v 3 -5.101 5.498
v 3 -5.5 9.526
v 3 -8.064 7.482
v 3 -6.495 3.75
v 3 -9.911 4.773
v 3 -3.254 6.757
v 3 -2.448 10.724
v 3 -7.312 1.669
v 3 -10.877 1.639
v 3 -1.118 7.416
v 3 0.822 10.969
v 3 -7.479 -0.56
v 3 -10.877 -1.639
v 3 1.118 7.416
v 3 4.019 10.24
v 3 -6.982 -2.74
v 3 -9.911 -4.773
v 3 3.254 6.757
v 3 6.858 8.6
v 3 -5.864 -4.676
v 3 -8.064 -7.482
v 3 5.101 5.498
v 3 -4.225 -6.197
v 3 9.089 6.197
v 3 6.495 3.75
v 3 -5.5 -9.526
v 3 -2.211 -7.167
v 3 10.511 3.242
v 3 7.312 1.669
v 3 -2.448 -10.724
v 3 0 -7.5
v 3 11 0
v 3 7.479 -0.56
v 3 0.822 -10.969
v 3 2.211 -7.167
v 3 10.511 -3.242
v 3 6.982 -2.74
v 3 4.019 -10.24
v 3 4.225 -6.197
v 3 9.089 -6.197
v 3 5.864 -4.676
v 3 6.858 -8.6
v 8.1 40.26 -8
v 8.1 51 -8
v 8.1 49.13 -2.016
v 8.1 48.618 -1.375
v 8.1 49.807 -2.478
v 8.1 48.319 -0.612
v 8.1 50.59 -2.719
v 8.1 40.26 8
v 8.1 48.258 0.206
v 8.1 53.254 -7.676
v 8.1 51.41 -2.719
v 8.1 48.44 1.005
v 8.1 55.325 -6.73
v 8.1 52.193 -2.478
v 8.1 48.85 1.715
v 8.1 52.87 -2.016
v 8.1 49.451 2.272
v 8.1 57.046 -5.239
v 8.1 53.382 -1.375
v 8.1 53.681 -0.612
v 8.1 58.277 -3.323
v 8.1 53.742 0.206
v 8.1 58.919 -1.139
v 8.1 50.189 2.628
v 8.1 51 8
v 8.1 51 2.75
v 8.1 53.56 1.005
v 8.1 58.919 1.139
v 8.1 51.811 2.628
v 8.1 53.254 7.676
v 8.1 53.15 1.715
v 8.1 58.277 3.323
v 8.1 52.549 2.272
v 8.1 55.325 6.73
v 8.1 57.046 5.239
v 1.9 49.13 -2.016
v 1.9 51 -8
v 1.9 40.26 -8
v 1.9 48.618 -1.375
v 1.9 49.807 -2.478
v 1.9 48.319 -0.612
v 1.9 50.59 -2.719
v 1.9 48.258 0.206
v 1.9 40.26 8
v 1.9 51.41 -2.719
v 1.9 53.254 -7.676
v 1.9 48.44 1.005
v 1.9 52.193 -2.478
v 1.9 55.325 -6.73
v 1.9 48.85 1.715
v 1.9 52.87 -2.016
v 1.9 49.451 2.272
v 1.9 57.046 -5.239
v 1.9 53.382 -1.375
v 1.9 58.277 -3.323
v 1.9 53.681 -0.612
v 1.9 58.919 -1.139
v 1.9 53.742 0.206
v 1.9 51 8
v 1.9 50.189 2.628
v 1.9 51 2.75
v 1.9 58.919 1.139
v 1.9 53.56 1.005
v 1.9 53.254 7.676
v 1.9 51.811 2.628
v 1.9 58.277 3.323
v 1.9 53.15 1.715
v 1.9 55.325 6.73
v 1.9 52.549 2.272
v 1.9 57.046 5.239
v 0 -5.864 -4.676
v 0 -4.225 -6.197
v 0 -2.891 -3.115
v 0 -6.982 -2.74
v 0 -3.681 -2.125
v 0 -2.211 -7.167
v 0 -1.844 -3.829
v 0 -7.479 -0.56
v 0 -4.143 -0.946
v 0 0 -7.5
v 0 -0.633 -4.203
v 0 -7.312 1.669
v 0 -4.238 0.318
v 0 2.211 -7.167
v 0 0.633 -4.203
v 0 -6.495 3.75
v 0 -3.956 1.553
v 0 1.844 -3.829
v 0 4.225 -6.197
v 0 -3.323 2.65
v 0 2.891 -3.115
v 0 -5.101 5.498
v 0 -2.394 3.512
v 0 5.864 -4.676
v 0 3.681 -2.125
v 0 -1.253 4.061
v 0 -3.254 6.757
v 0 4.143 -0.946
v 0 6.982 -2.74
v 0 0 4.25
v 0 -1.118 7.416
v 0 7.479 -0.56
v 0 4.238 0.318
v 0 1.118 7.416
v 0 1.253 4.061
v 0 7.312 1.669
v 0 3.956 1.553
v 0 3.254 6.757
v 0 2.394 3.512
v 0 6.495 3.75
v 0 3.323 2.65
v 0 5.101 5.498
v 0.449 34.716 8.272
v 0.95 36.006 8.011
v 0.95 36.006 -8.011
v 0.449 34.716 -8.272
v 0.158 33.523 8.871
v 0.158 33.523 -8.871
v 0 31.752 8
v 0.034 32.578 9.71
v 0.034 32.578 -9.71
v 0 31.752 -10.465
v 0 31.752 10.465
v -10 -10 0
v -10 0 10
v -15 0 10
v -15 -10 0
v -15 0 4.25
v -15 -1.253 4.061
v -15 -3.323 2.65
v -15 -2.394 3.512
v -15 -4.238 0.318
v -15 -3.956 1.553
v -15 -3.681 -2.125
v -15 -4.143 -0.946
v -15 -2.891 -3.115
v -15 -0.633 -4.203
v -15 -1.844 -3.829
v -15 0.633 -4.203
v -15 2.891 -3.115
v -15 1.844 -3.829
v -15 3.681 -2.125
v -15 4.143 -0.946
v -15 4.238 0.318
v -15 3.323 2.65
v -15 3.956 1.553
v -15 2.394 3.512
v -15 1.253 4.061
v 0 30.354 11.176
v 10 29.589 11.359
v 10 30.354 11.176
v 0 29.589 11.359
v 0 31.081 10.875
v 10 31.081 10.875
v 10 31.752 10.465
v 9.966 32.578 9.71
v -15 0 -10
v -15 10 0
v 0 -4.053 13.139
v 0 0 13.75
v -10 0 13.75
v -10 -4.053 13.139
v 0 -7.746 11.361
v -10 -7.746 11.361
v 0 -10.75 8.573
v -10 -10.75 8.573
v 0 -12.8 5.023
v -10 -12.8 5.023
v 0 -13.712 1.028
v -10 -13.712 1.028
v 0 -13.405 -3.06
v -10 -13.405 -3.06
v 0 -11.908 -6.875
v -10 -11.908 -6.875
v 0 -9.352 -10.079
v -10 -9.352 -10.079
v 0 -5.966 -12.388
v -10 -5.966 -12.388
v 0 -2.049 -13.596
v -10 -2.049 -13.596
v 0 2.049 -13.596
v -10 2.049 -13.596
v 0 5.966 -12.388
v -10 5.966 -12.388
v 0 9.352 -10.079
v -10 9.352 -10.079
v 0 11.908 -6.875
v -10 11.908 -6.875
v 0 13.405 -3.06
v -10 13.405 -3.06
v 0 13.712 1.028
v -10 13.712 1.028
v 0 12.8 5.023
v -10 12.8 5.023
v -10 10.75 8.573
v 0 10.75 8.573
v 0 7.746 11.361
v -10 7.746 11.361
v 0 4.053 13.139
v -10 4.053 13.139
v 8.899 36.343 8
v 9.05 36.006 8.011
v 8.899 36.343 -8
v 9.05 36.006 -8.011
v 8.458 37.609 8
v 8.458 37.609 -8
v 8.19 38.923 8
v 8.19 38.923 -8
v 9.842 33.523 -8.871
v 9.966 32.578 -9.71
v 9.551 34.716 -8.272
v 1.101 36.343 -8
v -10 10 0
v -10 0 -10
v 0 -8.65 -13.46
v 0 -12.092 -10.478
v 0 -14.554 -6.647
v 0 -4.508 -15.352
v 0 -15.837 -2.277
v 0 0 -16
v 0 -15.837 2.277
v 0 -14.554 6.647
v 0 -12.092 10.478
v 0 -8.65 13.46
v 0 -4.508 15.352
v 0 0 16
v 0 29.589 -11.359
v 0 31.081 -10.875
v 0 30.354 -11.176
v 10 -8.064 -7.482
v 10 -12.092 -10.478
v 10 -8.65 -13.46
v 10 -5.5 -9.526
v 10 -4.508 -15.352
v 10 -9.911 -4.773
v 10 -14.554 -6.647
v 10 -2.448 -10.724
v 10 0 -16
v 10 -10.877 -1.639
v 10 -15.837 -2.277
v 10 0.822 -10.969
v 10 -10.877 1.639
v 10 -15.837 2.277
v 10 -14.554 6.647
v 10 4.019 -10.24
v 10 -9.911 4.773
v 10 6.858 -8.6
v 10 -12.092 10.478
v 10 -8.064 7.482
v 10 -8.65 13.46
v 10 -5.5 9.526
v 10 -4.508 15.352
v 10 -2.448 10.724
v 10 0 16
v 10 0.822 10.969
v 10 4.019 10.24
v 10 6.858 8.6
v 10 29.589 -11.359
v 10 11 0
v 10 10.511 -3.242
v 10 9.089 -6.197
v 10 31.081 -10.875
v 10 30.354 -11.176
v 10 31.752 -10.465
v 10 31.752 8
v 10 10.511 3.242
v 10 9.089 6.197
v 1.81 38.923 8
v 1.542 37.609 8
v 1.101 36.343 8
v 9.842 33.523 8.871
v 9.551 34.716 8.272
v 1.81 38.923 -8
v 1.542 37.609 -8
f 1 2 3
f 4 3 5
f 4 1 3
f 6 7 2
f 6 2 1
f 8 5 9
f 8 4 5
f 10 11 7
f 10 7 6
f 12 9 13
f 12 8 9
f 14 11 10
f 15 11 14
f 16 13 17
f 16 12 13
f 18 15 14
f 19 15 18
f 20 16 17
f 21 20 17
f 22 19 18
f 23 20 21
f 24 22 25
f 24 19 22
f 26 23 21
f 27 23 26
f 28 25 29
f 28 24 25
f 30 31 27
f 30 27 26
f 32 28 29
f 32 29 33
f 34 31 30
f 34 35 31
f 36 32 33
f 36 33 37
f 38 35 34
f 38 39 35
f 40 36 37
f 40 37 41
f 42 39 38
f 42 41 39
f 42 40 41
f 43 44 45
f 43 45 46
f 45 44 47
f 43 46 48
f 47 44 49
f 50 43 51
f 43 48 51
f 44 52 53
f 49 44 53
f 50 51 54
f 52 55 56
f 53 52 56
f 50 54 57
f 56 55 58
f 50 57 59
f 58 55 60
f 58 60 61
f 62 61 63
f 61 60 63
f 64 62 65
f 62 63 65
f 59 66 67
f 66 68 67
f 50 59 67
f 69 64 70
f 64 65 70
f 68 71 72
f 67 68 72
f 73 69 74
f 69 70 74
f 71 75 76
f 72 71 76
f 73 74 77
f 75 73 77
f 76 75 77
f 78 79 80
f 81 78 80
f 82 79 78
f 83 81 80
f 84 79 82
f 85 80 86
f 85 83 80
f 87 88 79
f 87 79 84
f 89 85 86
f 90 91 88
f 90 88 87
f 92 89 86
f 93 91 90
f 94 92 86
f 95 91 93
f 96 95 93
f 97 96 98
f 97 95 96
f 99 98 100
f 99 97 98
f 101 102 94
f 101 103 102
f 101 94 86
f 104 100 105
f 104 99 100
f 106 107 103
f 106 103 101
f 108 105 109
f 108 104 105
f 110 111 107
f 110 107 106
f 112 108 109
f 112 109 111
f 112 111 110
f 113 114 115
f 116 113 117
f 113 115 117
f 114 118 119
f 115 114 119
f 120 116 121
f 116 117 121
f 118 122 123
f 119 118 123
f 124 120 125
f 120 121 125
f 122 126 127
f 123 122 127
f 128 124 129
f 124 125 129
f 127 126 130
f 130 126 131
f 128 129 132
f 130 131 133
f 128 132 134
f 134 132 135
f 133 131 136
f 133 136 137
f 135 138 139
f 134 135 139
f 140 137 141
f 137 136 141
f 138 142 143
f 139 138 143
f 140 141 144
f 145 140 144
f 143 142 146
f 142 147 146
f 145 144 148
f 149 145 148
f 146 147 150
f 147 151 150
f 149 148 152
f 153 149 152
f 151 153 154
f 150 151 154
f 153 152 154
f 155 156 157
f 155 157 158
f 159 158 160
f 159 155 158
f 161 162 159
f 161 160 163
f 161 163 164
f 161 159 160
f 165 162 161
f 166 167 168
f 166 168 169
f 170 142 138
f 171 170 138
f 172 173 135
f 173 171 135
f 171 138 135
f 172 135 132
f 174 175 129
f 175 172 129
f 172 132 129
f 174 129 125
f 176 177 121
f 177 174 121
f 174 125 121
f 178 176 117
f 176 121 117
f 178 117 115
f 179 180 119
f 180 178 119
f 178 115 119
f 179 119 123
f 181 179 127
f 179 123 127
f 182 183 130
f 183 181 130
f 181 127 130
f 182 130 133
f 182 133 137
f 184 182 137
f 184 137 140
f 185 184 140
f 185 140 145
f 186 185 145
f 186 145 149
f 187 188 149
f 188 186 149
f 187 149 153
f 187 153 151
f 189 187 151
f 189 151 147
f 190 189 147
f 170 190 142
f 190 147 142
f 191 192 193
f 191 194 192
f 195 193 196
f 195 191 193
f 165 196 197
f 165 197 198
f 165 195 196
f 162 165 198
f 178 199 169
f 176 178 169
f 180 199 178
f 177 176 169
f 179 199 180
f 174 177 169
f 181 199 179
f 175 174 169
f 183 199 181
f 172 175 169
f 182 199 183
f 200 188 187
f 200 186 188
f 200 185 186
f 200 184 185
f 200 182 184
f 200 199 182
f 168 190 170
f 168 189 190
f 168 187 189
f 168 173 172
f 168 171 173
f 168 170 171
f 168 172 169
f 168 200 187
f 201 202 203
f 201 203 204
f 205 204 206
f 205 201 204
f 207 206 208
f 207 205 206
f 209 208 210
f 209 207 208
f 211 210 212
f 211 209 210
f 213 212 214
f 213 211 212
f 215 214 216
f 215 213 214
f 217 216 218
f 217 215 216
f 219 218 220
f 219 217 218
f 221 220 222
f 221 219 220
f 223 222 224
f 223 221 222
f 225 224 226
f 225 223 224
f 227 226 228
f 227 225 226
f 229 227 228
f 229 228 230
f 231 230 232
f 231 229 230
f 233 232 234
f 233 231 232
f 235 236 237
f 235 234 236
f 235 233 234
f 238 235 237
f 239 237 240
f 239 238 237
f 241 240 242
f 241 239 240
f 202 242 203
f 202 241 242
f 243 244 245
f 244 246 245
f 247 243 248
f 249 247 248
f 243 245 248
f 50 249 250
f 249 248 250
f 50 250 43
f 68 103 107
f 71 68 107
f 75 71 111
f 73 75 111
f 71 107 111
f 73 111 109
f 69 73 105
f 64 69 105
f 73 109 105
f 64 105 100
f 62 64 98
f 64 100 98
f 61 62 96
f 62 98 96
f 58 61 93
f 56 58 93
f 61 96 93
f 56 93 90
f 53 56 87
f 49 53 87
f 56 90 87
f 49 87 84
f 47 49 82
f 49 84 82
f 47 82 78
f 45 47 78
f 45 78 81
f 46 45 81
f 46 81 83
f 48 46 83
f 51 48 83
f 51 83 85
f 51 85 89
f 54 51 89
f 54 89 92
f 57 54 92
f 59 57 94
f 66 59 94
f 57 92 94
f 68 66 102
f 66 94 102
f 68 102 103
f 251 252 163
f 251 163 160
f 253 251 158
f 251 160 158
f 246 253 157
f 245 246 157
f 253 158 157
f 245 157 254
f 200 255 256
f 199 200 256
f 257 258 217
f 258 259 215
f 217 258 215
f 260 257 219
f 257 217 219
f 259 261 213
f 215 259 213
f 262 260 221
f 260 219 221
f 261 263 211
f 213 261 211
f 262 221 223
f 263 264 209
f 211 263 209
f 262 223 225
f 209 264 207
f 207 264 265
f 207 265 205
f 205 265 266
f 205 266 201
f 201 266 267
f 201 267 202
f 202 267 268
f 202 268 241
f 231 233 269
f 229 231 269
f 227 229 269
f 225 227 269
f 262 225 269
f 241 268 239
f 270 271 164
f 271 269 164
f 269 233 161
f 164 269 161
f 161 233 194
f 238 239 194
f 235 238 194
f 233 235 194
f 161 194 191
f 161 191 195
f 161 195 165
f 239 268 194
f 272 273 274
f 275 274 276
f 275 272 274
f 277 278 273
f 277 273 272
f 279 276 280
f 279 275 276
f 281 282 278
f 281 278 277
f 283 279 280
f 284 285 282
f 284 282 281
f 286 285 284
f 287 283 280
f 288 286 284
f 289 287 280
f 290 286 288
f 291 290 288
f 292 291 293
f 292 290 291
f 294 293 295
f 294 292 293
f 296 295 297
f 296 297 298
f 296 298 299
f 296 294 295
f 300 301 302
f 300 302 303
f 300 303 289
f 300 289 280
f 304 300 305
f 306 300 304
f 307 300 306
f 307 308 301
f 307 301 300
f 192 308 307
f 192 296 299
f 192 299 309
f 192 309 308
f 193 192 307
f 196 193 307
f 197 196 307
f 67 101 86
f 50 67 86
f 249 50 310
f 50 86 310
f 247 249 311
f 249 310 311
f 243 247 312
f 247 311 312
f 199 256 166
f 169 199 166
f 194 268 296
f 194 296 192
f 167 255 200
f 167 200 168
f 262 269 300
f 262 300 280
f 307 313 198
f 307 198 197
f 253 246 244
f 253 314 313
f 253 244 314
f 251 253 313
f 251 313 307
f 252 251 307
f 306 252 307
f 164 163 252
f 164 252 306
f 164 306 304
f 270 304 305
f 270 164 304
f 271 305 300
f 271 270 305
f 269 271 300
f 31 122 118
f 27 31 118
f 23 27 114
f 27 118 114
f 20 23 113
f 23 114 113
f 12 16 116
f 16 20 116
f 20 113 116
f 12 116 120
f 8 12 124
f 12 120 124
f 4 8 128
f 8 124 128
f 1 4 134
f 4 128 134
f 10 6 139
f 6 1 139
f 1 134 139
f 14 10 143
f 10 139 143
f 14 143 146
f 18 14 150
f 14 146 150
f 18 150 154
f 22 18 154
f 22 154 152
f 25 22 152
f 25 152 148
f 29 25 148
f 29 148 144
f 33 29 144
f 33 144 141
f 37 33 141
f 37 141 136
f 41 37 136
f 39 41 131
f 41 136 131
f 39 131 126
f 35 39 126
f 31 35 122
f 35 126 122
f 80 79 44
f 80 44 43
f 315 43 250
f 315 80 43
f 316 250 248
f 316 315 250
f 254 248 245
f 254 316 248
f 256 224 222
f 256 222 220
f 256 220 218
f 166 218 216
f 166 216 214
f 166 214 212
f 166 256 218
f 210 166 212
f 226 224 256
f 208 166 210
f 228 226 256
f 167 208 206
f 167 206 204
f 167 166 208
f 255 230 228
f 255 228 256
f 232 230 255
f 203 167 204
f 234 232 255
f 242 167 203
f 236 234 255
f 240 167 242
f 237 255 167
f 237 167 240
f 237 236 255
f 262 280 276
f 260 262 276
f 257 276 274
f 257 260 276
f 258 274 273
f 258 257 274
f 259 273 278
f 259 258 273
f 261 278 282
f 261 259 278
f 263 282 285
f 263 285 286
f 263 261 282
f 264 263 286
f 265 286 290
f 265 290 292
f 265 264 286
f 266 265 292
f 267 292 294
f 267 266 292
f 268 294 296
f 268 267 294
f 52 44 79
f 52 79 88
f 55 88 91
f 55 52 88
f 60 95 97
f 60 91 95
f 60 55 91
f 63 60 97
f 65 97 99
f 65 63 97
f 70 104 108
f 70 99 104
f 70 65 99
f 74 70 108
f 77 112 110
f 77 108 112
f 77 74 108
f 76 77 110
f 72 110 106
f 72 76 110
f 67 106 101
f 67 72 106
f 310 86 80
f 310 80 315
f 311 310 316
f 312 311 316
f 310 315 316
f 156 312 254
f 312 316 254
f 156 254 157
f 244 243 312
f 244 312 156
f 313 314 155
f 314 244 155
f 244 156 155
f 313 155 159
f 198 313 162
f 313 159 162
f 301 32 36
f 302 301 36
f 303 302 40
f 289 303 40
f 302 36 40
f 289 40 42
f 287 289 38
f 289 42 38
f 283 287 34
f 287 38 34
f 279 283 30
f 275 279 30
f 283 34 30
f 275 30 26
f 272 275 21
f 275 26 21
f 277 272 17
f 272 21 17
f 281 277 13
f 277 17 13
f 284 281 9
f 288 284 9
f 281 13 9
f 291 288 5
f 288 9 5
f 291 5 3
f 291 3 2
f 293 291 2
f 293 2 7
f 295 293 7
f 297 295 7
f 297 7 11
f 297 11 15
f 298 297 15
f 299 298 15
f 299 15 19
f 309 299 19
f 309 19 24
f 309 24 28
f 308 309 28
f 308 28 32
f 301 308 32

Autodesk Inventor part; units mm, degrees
ref_plane "YZ Plane" through (0, 0, 0) normal (1, 0, 0) x (0, 1, 0)
ref_plane "XZ Plane" through (0, 0, 0) normal (0, 1, 0) x (-1, 0, 0)
sketch "Esquisse1" plane through (0, 0, 0) normal (1, 0, 0) x (0, 1, 0)
  circle A0 centre (0, 0) radius 16
  line L0 (-16, 0) -> (59, 0)
  line L1 (59, 0) -> (51, 0)
  circle A1 centre (51, 0) radius 5
  circle A2 centre (51, 0) radius 8
  line L2 (0, 16) -> (51, 8)
  line L3 (51, -8) -> (0, -16)
  circle A3 centre (0, 0) radius 11
  line L4 (34.396, -10.6045) -> (34.396, 10.6045)
  dimension "d0" = 32
  dimension "d1" = 75
  dimension "d2" = 8
  dimension "d3" = 10
  dimension "d4" = 16
  dimension "d5" = 22
extrude "Extrusion1" add sketch "Esquisse1" along normal blind 10 contours L2 A0 L0 A3 | L0 A3 A0 L3 | L2 L4 L0 A0 | L0 L4 L3 A0
sketch "Esquisse2" plane through (0, 0, 0) normal (-1, 0, 0) x (0, 0, 1)
  circle A0 centre (0, 0) radius 11
  circle A1 centre (0, 0) radius 4.25
  dimension "d8" = 8.5
extrude "Extrusion2" add sketch "Esquisse2" along normal blind 10
sketch "Esquisse3" plane through (-10, 0, 0) normal (-1, 0, 0) x (0, 0, 1)
  line L0 (0, 0) -> (-10, 0)
  circle A0 centre (0, 0) radius 11 projected
  line L1 (0, 0) -> (0, 10)
  circle A1 centre (0, 0) radius 4.25 projected
  line L2 (0, 0) -> (10, 0)
  line L3 (0, 0) -> (0, -10)
  line L4 (0, 10) -> (-10, 0)
  line L5 (0, 10) -> (10, 0)
  line L6 (10, 0) -> (0, -10)
  line L7 (-10, 0) -> (0, -10)
  circle A2 centre (0, 0) radius 4.25
  dimension "d12" = 10
  dimension "d13" = 10
  dimension "d14" = 10
  dimension "d15" = 10
  dimension "d16" = 8.5
extrude "Extrusion3" add sketch "Esquisse3" along normal blind 5 contours A1 L3 L7 L0 | L0 L4 L1 A1 | L1 L5 L2 A1 | L2 L6 L3 A1
sketch "Esquisse4" plane through (0, 0, 0) normal (-1, 0, 0) x (0, 0, 1)
  circle A0 centre (0, 0) radius 13.75
  circle A1 centre (0, 0) radius 11
  dimension "d19" = 27.5
extrude "Extrusion4" add sketch "Esquisse4" along normal up to surface (10 mm away)
ref_plane "Plan de construction1" through (5, 0, 0) normal (-1, 0, 0) x (0, 0, 1)
sketch "Esquisse7" plane through (5, 0, 0) normal (-1, 0, 0) x (0, 0, 1)
  point P0 (0, 0)
sketch "Esquisse8" plane through (5, 0, 0) normal (-1, 0, 0) x (0, 0, 1)
  circle A0 centre (0, 51) radius 5 projected
  circle A1 centre (0, 51) radius 4.25 projected
  line L0 (-16, 0) -> (-10.6045, 34.396) projected
  line L1 (10.6045, 34.396) -> (16, 0) projected
  arc A2 (8, 51) -> (-8, 51) centre (0, 51) ccw projected
  line L2 (-10.6045, 34.396) -> (10.6045, 34.396) projected
  line L3 (-10.6045, 34.396) -> (-8, 51)
  line L4 (8, 51) -> (10.6045, 34.396)
  line L5 (10.6045, 34.396) -> (-10.6045, 34.396)
  point P0 (0, 0)
extrude "Extrusion6" add sketch "Esquisse8" along normal mid plane 6.2 contours A0 | L4 L2 L3 A2
fillet "Congé1" radius 10 4 edges at (8.1, 34.396, 0) (1.9, 34.396, 0) (10, 34.396, 0) (0, 34.396, 0)
sketch "Esquisse10" plane through (0, 0, 0) normal (-1, 0, 0) x (0, 0, 1)
  line L0 (-11.0193, 31.7521) -> (11.0193, 31.7521) projected
  line L1 (-11.0193, 31.7521) -> (11.0193, 31.7521)
  arc A0 (8, 51) -> (-8, 51) centre (0, 51) ccw projected
  line L2 (-8, 51) -> (-8, 31.7521)
  line L3 (9.6847, 40.2603) -> (8, 51) projected
  line L4 (8, 51) -> (8, 31.7521)
  arc A1 (8, 51) -> (-8, 51) centre (0, 51) ccw
  line L5 (-11.0193, 31.7521) -> (-8, 51)
  line L6 (8, 51) -> (11.0193, 31.7521)
  point P0 (0, 0)
extrude "Extrusion8" cut sketch "Esquisse10" against normal blind 10 contours L5 L2 L0 | L4 L3 L6 L0
fillet "Congé2" radius 5 2 edges at (5, 31.7521, -8) (5, 31.7521, -11.0193)
fillet "Congé3" radius 5 2 edges at (5, 31.7521, 11.0193) (5, 31.7521, 8)
sketch "Esquisse11" plane through (0, 0, 0) normal (1, 0, 0) x (0, 0, -1)
  circle A0 centre (0, 0) radius 11 projected
  circle A1 centre (0, 0) radius 7.5
  dimension "d45" = 15
extrude "Extrusion9" add sketch "Esquisse11" along normal blind 3
sketch "Esquisse13" plane through (1.9, 0, 0) normal (-1, 0, 0) x (0, 0, 1)
  circle A0 centre (0, 51) radius 4.25 projected
  circle A1 centre (0, 51) radius 2.75
  point P0 (0, 0)
  dimension "d51" = 5.5
extrude "Extrusion11" add sketch "Esquisse13" against normal up to surface (6.2 mm away)
properties part number "bièlle côté"
